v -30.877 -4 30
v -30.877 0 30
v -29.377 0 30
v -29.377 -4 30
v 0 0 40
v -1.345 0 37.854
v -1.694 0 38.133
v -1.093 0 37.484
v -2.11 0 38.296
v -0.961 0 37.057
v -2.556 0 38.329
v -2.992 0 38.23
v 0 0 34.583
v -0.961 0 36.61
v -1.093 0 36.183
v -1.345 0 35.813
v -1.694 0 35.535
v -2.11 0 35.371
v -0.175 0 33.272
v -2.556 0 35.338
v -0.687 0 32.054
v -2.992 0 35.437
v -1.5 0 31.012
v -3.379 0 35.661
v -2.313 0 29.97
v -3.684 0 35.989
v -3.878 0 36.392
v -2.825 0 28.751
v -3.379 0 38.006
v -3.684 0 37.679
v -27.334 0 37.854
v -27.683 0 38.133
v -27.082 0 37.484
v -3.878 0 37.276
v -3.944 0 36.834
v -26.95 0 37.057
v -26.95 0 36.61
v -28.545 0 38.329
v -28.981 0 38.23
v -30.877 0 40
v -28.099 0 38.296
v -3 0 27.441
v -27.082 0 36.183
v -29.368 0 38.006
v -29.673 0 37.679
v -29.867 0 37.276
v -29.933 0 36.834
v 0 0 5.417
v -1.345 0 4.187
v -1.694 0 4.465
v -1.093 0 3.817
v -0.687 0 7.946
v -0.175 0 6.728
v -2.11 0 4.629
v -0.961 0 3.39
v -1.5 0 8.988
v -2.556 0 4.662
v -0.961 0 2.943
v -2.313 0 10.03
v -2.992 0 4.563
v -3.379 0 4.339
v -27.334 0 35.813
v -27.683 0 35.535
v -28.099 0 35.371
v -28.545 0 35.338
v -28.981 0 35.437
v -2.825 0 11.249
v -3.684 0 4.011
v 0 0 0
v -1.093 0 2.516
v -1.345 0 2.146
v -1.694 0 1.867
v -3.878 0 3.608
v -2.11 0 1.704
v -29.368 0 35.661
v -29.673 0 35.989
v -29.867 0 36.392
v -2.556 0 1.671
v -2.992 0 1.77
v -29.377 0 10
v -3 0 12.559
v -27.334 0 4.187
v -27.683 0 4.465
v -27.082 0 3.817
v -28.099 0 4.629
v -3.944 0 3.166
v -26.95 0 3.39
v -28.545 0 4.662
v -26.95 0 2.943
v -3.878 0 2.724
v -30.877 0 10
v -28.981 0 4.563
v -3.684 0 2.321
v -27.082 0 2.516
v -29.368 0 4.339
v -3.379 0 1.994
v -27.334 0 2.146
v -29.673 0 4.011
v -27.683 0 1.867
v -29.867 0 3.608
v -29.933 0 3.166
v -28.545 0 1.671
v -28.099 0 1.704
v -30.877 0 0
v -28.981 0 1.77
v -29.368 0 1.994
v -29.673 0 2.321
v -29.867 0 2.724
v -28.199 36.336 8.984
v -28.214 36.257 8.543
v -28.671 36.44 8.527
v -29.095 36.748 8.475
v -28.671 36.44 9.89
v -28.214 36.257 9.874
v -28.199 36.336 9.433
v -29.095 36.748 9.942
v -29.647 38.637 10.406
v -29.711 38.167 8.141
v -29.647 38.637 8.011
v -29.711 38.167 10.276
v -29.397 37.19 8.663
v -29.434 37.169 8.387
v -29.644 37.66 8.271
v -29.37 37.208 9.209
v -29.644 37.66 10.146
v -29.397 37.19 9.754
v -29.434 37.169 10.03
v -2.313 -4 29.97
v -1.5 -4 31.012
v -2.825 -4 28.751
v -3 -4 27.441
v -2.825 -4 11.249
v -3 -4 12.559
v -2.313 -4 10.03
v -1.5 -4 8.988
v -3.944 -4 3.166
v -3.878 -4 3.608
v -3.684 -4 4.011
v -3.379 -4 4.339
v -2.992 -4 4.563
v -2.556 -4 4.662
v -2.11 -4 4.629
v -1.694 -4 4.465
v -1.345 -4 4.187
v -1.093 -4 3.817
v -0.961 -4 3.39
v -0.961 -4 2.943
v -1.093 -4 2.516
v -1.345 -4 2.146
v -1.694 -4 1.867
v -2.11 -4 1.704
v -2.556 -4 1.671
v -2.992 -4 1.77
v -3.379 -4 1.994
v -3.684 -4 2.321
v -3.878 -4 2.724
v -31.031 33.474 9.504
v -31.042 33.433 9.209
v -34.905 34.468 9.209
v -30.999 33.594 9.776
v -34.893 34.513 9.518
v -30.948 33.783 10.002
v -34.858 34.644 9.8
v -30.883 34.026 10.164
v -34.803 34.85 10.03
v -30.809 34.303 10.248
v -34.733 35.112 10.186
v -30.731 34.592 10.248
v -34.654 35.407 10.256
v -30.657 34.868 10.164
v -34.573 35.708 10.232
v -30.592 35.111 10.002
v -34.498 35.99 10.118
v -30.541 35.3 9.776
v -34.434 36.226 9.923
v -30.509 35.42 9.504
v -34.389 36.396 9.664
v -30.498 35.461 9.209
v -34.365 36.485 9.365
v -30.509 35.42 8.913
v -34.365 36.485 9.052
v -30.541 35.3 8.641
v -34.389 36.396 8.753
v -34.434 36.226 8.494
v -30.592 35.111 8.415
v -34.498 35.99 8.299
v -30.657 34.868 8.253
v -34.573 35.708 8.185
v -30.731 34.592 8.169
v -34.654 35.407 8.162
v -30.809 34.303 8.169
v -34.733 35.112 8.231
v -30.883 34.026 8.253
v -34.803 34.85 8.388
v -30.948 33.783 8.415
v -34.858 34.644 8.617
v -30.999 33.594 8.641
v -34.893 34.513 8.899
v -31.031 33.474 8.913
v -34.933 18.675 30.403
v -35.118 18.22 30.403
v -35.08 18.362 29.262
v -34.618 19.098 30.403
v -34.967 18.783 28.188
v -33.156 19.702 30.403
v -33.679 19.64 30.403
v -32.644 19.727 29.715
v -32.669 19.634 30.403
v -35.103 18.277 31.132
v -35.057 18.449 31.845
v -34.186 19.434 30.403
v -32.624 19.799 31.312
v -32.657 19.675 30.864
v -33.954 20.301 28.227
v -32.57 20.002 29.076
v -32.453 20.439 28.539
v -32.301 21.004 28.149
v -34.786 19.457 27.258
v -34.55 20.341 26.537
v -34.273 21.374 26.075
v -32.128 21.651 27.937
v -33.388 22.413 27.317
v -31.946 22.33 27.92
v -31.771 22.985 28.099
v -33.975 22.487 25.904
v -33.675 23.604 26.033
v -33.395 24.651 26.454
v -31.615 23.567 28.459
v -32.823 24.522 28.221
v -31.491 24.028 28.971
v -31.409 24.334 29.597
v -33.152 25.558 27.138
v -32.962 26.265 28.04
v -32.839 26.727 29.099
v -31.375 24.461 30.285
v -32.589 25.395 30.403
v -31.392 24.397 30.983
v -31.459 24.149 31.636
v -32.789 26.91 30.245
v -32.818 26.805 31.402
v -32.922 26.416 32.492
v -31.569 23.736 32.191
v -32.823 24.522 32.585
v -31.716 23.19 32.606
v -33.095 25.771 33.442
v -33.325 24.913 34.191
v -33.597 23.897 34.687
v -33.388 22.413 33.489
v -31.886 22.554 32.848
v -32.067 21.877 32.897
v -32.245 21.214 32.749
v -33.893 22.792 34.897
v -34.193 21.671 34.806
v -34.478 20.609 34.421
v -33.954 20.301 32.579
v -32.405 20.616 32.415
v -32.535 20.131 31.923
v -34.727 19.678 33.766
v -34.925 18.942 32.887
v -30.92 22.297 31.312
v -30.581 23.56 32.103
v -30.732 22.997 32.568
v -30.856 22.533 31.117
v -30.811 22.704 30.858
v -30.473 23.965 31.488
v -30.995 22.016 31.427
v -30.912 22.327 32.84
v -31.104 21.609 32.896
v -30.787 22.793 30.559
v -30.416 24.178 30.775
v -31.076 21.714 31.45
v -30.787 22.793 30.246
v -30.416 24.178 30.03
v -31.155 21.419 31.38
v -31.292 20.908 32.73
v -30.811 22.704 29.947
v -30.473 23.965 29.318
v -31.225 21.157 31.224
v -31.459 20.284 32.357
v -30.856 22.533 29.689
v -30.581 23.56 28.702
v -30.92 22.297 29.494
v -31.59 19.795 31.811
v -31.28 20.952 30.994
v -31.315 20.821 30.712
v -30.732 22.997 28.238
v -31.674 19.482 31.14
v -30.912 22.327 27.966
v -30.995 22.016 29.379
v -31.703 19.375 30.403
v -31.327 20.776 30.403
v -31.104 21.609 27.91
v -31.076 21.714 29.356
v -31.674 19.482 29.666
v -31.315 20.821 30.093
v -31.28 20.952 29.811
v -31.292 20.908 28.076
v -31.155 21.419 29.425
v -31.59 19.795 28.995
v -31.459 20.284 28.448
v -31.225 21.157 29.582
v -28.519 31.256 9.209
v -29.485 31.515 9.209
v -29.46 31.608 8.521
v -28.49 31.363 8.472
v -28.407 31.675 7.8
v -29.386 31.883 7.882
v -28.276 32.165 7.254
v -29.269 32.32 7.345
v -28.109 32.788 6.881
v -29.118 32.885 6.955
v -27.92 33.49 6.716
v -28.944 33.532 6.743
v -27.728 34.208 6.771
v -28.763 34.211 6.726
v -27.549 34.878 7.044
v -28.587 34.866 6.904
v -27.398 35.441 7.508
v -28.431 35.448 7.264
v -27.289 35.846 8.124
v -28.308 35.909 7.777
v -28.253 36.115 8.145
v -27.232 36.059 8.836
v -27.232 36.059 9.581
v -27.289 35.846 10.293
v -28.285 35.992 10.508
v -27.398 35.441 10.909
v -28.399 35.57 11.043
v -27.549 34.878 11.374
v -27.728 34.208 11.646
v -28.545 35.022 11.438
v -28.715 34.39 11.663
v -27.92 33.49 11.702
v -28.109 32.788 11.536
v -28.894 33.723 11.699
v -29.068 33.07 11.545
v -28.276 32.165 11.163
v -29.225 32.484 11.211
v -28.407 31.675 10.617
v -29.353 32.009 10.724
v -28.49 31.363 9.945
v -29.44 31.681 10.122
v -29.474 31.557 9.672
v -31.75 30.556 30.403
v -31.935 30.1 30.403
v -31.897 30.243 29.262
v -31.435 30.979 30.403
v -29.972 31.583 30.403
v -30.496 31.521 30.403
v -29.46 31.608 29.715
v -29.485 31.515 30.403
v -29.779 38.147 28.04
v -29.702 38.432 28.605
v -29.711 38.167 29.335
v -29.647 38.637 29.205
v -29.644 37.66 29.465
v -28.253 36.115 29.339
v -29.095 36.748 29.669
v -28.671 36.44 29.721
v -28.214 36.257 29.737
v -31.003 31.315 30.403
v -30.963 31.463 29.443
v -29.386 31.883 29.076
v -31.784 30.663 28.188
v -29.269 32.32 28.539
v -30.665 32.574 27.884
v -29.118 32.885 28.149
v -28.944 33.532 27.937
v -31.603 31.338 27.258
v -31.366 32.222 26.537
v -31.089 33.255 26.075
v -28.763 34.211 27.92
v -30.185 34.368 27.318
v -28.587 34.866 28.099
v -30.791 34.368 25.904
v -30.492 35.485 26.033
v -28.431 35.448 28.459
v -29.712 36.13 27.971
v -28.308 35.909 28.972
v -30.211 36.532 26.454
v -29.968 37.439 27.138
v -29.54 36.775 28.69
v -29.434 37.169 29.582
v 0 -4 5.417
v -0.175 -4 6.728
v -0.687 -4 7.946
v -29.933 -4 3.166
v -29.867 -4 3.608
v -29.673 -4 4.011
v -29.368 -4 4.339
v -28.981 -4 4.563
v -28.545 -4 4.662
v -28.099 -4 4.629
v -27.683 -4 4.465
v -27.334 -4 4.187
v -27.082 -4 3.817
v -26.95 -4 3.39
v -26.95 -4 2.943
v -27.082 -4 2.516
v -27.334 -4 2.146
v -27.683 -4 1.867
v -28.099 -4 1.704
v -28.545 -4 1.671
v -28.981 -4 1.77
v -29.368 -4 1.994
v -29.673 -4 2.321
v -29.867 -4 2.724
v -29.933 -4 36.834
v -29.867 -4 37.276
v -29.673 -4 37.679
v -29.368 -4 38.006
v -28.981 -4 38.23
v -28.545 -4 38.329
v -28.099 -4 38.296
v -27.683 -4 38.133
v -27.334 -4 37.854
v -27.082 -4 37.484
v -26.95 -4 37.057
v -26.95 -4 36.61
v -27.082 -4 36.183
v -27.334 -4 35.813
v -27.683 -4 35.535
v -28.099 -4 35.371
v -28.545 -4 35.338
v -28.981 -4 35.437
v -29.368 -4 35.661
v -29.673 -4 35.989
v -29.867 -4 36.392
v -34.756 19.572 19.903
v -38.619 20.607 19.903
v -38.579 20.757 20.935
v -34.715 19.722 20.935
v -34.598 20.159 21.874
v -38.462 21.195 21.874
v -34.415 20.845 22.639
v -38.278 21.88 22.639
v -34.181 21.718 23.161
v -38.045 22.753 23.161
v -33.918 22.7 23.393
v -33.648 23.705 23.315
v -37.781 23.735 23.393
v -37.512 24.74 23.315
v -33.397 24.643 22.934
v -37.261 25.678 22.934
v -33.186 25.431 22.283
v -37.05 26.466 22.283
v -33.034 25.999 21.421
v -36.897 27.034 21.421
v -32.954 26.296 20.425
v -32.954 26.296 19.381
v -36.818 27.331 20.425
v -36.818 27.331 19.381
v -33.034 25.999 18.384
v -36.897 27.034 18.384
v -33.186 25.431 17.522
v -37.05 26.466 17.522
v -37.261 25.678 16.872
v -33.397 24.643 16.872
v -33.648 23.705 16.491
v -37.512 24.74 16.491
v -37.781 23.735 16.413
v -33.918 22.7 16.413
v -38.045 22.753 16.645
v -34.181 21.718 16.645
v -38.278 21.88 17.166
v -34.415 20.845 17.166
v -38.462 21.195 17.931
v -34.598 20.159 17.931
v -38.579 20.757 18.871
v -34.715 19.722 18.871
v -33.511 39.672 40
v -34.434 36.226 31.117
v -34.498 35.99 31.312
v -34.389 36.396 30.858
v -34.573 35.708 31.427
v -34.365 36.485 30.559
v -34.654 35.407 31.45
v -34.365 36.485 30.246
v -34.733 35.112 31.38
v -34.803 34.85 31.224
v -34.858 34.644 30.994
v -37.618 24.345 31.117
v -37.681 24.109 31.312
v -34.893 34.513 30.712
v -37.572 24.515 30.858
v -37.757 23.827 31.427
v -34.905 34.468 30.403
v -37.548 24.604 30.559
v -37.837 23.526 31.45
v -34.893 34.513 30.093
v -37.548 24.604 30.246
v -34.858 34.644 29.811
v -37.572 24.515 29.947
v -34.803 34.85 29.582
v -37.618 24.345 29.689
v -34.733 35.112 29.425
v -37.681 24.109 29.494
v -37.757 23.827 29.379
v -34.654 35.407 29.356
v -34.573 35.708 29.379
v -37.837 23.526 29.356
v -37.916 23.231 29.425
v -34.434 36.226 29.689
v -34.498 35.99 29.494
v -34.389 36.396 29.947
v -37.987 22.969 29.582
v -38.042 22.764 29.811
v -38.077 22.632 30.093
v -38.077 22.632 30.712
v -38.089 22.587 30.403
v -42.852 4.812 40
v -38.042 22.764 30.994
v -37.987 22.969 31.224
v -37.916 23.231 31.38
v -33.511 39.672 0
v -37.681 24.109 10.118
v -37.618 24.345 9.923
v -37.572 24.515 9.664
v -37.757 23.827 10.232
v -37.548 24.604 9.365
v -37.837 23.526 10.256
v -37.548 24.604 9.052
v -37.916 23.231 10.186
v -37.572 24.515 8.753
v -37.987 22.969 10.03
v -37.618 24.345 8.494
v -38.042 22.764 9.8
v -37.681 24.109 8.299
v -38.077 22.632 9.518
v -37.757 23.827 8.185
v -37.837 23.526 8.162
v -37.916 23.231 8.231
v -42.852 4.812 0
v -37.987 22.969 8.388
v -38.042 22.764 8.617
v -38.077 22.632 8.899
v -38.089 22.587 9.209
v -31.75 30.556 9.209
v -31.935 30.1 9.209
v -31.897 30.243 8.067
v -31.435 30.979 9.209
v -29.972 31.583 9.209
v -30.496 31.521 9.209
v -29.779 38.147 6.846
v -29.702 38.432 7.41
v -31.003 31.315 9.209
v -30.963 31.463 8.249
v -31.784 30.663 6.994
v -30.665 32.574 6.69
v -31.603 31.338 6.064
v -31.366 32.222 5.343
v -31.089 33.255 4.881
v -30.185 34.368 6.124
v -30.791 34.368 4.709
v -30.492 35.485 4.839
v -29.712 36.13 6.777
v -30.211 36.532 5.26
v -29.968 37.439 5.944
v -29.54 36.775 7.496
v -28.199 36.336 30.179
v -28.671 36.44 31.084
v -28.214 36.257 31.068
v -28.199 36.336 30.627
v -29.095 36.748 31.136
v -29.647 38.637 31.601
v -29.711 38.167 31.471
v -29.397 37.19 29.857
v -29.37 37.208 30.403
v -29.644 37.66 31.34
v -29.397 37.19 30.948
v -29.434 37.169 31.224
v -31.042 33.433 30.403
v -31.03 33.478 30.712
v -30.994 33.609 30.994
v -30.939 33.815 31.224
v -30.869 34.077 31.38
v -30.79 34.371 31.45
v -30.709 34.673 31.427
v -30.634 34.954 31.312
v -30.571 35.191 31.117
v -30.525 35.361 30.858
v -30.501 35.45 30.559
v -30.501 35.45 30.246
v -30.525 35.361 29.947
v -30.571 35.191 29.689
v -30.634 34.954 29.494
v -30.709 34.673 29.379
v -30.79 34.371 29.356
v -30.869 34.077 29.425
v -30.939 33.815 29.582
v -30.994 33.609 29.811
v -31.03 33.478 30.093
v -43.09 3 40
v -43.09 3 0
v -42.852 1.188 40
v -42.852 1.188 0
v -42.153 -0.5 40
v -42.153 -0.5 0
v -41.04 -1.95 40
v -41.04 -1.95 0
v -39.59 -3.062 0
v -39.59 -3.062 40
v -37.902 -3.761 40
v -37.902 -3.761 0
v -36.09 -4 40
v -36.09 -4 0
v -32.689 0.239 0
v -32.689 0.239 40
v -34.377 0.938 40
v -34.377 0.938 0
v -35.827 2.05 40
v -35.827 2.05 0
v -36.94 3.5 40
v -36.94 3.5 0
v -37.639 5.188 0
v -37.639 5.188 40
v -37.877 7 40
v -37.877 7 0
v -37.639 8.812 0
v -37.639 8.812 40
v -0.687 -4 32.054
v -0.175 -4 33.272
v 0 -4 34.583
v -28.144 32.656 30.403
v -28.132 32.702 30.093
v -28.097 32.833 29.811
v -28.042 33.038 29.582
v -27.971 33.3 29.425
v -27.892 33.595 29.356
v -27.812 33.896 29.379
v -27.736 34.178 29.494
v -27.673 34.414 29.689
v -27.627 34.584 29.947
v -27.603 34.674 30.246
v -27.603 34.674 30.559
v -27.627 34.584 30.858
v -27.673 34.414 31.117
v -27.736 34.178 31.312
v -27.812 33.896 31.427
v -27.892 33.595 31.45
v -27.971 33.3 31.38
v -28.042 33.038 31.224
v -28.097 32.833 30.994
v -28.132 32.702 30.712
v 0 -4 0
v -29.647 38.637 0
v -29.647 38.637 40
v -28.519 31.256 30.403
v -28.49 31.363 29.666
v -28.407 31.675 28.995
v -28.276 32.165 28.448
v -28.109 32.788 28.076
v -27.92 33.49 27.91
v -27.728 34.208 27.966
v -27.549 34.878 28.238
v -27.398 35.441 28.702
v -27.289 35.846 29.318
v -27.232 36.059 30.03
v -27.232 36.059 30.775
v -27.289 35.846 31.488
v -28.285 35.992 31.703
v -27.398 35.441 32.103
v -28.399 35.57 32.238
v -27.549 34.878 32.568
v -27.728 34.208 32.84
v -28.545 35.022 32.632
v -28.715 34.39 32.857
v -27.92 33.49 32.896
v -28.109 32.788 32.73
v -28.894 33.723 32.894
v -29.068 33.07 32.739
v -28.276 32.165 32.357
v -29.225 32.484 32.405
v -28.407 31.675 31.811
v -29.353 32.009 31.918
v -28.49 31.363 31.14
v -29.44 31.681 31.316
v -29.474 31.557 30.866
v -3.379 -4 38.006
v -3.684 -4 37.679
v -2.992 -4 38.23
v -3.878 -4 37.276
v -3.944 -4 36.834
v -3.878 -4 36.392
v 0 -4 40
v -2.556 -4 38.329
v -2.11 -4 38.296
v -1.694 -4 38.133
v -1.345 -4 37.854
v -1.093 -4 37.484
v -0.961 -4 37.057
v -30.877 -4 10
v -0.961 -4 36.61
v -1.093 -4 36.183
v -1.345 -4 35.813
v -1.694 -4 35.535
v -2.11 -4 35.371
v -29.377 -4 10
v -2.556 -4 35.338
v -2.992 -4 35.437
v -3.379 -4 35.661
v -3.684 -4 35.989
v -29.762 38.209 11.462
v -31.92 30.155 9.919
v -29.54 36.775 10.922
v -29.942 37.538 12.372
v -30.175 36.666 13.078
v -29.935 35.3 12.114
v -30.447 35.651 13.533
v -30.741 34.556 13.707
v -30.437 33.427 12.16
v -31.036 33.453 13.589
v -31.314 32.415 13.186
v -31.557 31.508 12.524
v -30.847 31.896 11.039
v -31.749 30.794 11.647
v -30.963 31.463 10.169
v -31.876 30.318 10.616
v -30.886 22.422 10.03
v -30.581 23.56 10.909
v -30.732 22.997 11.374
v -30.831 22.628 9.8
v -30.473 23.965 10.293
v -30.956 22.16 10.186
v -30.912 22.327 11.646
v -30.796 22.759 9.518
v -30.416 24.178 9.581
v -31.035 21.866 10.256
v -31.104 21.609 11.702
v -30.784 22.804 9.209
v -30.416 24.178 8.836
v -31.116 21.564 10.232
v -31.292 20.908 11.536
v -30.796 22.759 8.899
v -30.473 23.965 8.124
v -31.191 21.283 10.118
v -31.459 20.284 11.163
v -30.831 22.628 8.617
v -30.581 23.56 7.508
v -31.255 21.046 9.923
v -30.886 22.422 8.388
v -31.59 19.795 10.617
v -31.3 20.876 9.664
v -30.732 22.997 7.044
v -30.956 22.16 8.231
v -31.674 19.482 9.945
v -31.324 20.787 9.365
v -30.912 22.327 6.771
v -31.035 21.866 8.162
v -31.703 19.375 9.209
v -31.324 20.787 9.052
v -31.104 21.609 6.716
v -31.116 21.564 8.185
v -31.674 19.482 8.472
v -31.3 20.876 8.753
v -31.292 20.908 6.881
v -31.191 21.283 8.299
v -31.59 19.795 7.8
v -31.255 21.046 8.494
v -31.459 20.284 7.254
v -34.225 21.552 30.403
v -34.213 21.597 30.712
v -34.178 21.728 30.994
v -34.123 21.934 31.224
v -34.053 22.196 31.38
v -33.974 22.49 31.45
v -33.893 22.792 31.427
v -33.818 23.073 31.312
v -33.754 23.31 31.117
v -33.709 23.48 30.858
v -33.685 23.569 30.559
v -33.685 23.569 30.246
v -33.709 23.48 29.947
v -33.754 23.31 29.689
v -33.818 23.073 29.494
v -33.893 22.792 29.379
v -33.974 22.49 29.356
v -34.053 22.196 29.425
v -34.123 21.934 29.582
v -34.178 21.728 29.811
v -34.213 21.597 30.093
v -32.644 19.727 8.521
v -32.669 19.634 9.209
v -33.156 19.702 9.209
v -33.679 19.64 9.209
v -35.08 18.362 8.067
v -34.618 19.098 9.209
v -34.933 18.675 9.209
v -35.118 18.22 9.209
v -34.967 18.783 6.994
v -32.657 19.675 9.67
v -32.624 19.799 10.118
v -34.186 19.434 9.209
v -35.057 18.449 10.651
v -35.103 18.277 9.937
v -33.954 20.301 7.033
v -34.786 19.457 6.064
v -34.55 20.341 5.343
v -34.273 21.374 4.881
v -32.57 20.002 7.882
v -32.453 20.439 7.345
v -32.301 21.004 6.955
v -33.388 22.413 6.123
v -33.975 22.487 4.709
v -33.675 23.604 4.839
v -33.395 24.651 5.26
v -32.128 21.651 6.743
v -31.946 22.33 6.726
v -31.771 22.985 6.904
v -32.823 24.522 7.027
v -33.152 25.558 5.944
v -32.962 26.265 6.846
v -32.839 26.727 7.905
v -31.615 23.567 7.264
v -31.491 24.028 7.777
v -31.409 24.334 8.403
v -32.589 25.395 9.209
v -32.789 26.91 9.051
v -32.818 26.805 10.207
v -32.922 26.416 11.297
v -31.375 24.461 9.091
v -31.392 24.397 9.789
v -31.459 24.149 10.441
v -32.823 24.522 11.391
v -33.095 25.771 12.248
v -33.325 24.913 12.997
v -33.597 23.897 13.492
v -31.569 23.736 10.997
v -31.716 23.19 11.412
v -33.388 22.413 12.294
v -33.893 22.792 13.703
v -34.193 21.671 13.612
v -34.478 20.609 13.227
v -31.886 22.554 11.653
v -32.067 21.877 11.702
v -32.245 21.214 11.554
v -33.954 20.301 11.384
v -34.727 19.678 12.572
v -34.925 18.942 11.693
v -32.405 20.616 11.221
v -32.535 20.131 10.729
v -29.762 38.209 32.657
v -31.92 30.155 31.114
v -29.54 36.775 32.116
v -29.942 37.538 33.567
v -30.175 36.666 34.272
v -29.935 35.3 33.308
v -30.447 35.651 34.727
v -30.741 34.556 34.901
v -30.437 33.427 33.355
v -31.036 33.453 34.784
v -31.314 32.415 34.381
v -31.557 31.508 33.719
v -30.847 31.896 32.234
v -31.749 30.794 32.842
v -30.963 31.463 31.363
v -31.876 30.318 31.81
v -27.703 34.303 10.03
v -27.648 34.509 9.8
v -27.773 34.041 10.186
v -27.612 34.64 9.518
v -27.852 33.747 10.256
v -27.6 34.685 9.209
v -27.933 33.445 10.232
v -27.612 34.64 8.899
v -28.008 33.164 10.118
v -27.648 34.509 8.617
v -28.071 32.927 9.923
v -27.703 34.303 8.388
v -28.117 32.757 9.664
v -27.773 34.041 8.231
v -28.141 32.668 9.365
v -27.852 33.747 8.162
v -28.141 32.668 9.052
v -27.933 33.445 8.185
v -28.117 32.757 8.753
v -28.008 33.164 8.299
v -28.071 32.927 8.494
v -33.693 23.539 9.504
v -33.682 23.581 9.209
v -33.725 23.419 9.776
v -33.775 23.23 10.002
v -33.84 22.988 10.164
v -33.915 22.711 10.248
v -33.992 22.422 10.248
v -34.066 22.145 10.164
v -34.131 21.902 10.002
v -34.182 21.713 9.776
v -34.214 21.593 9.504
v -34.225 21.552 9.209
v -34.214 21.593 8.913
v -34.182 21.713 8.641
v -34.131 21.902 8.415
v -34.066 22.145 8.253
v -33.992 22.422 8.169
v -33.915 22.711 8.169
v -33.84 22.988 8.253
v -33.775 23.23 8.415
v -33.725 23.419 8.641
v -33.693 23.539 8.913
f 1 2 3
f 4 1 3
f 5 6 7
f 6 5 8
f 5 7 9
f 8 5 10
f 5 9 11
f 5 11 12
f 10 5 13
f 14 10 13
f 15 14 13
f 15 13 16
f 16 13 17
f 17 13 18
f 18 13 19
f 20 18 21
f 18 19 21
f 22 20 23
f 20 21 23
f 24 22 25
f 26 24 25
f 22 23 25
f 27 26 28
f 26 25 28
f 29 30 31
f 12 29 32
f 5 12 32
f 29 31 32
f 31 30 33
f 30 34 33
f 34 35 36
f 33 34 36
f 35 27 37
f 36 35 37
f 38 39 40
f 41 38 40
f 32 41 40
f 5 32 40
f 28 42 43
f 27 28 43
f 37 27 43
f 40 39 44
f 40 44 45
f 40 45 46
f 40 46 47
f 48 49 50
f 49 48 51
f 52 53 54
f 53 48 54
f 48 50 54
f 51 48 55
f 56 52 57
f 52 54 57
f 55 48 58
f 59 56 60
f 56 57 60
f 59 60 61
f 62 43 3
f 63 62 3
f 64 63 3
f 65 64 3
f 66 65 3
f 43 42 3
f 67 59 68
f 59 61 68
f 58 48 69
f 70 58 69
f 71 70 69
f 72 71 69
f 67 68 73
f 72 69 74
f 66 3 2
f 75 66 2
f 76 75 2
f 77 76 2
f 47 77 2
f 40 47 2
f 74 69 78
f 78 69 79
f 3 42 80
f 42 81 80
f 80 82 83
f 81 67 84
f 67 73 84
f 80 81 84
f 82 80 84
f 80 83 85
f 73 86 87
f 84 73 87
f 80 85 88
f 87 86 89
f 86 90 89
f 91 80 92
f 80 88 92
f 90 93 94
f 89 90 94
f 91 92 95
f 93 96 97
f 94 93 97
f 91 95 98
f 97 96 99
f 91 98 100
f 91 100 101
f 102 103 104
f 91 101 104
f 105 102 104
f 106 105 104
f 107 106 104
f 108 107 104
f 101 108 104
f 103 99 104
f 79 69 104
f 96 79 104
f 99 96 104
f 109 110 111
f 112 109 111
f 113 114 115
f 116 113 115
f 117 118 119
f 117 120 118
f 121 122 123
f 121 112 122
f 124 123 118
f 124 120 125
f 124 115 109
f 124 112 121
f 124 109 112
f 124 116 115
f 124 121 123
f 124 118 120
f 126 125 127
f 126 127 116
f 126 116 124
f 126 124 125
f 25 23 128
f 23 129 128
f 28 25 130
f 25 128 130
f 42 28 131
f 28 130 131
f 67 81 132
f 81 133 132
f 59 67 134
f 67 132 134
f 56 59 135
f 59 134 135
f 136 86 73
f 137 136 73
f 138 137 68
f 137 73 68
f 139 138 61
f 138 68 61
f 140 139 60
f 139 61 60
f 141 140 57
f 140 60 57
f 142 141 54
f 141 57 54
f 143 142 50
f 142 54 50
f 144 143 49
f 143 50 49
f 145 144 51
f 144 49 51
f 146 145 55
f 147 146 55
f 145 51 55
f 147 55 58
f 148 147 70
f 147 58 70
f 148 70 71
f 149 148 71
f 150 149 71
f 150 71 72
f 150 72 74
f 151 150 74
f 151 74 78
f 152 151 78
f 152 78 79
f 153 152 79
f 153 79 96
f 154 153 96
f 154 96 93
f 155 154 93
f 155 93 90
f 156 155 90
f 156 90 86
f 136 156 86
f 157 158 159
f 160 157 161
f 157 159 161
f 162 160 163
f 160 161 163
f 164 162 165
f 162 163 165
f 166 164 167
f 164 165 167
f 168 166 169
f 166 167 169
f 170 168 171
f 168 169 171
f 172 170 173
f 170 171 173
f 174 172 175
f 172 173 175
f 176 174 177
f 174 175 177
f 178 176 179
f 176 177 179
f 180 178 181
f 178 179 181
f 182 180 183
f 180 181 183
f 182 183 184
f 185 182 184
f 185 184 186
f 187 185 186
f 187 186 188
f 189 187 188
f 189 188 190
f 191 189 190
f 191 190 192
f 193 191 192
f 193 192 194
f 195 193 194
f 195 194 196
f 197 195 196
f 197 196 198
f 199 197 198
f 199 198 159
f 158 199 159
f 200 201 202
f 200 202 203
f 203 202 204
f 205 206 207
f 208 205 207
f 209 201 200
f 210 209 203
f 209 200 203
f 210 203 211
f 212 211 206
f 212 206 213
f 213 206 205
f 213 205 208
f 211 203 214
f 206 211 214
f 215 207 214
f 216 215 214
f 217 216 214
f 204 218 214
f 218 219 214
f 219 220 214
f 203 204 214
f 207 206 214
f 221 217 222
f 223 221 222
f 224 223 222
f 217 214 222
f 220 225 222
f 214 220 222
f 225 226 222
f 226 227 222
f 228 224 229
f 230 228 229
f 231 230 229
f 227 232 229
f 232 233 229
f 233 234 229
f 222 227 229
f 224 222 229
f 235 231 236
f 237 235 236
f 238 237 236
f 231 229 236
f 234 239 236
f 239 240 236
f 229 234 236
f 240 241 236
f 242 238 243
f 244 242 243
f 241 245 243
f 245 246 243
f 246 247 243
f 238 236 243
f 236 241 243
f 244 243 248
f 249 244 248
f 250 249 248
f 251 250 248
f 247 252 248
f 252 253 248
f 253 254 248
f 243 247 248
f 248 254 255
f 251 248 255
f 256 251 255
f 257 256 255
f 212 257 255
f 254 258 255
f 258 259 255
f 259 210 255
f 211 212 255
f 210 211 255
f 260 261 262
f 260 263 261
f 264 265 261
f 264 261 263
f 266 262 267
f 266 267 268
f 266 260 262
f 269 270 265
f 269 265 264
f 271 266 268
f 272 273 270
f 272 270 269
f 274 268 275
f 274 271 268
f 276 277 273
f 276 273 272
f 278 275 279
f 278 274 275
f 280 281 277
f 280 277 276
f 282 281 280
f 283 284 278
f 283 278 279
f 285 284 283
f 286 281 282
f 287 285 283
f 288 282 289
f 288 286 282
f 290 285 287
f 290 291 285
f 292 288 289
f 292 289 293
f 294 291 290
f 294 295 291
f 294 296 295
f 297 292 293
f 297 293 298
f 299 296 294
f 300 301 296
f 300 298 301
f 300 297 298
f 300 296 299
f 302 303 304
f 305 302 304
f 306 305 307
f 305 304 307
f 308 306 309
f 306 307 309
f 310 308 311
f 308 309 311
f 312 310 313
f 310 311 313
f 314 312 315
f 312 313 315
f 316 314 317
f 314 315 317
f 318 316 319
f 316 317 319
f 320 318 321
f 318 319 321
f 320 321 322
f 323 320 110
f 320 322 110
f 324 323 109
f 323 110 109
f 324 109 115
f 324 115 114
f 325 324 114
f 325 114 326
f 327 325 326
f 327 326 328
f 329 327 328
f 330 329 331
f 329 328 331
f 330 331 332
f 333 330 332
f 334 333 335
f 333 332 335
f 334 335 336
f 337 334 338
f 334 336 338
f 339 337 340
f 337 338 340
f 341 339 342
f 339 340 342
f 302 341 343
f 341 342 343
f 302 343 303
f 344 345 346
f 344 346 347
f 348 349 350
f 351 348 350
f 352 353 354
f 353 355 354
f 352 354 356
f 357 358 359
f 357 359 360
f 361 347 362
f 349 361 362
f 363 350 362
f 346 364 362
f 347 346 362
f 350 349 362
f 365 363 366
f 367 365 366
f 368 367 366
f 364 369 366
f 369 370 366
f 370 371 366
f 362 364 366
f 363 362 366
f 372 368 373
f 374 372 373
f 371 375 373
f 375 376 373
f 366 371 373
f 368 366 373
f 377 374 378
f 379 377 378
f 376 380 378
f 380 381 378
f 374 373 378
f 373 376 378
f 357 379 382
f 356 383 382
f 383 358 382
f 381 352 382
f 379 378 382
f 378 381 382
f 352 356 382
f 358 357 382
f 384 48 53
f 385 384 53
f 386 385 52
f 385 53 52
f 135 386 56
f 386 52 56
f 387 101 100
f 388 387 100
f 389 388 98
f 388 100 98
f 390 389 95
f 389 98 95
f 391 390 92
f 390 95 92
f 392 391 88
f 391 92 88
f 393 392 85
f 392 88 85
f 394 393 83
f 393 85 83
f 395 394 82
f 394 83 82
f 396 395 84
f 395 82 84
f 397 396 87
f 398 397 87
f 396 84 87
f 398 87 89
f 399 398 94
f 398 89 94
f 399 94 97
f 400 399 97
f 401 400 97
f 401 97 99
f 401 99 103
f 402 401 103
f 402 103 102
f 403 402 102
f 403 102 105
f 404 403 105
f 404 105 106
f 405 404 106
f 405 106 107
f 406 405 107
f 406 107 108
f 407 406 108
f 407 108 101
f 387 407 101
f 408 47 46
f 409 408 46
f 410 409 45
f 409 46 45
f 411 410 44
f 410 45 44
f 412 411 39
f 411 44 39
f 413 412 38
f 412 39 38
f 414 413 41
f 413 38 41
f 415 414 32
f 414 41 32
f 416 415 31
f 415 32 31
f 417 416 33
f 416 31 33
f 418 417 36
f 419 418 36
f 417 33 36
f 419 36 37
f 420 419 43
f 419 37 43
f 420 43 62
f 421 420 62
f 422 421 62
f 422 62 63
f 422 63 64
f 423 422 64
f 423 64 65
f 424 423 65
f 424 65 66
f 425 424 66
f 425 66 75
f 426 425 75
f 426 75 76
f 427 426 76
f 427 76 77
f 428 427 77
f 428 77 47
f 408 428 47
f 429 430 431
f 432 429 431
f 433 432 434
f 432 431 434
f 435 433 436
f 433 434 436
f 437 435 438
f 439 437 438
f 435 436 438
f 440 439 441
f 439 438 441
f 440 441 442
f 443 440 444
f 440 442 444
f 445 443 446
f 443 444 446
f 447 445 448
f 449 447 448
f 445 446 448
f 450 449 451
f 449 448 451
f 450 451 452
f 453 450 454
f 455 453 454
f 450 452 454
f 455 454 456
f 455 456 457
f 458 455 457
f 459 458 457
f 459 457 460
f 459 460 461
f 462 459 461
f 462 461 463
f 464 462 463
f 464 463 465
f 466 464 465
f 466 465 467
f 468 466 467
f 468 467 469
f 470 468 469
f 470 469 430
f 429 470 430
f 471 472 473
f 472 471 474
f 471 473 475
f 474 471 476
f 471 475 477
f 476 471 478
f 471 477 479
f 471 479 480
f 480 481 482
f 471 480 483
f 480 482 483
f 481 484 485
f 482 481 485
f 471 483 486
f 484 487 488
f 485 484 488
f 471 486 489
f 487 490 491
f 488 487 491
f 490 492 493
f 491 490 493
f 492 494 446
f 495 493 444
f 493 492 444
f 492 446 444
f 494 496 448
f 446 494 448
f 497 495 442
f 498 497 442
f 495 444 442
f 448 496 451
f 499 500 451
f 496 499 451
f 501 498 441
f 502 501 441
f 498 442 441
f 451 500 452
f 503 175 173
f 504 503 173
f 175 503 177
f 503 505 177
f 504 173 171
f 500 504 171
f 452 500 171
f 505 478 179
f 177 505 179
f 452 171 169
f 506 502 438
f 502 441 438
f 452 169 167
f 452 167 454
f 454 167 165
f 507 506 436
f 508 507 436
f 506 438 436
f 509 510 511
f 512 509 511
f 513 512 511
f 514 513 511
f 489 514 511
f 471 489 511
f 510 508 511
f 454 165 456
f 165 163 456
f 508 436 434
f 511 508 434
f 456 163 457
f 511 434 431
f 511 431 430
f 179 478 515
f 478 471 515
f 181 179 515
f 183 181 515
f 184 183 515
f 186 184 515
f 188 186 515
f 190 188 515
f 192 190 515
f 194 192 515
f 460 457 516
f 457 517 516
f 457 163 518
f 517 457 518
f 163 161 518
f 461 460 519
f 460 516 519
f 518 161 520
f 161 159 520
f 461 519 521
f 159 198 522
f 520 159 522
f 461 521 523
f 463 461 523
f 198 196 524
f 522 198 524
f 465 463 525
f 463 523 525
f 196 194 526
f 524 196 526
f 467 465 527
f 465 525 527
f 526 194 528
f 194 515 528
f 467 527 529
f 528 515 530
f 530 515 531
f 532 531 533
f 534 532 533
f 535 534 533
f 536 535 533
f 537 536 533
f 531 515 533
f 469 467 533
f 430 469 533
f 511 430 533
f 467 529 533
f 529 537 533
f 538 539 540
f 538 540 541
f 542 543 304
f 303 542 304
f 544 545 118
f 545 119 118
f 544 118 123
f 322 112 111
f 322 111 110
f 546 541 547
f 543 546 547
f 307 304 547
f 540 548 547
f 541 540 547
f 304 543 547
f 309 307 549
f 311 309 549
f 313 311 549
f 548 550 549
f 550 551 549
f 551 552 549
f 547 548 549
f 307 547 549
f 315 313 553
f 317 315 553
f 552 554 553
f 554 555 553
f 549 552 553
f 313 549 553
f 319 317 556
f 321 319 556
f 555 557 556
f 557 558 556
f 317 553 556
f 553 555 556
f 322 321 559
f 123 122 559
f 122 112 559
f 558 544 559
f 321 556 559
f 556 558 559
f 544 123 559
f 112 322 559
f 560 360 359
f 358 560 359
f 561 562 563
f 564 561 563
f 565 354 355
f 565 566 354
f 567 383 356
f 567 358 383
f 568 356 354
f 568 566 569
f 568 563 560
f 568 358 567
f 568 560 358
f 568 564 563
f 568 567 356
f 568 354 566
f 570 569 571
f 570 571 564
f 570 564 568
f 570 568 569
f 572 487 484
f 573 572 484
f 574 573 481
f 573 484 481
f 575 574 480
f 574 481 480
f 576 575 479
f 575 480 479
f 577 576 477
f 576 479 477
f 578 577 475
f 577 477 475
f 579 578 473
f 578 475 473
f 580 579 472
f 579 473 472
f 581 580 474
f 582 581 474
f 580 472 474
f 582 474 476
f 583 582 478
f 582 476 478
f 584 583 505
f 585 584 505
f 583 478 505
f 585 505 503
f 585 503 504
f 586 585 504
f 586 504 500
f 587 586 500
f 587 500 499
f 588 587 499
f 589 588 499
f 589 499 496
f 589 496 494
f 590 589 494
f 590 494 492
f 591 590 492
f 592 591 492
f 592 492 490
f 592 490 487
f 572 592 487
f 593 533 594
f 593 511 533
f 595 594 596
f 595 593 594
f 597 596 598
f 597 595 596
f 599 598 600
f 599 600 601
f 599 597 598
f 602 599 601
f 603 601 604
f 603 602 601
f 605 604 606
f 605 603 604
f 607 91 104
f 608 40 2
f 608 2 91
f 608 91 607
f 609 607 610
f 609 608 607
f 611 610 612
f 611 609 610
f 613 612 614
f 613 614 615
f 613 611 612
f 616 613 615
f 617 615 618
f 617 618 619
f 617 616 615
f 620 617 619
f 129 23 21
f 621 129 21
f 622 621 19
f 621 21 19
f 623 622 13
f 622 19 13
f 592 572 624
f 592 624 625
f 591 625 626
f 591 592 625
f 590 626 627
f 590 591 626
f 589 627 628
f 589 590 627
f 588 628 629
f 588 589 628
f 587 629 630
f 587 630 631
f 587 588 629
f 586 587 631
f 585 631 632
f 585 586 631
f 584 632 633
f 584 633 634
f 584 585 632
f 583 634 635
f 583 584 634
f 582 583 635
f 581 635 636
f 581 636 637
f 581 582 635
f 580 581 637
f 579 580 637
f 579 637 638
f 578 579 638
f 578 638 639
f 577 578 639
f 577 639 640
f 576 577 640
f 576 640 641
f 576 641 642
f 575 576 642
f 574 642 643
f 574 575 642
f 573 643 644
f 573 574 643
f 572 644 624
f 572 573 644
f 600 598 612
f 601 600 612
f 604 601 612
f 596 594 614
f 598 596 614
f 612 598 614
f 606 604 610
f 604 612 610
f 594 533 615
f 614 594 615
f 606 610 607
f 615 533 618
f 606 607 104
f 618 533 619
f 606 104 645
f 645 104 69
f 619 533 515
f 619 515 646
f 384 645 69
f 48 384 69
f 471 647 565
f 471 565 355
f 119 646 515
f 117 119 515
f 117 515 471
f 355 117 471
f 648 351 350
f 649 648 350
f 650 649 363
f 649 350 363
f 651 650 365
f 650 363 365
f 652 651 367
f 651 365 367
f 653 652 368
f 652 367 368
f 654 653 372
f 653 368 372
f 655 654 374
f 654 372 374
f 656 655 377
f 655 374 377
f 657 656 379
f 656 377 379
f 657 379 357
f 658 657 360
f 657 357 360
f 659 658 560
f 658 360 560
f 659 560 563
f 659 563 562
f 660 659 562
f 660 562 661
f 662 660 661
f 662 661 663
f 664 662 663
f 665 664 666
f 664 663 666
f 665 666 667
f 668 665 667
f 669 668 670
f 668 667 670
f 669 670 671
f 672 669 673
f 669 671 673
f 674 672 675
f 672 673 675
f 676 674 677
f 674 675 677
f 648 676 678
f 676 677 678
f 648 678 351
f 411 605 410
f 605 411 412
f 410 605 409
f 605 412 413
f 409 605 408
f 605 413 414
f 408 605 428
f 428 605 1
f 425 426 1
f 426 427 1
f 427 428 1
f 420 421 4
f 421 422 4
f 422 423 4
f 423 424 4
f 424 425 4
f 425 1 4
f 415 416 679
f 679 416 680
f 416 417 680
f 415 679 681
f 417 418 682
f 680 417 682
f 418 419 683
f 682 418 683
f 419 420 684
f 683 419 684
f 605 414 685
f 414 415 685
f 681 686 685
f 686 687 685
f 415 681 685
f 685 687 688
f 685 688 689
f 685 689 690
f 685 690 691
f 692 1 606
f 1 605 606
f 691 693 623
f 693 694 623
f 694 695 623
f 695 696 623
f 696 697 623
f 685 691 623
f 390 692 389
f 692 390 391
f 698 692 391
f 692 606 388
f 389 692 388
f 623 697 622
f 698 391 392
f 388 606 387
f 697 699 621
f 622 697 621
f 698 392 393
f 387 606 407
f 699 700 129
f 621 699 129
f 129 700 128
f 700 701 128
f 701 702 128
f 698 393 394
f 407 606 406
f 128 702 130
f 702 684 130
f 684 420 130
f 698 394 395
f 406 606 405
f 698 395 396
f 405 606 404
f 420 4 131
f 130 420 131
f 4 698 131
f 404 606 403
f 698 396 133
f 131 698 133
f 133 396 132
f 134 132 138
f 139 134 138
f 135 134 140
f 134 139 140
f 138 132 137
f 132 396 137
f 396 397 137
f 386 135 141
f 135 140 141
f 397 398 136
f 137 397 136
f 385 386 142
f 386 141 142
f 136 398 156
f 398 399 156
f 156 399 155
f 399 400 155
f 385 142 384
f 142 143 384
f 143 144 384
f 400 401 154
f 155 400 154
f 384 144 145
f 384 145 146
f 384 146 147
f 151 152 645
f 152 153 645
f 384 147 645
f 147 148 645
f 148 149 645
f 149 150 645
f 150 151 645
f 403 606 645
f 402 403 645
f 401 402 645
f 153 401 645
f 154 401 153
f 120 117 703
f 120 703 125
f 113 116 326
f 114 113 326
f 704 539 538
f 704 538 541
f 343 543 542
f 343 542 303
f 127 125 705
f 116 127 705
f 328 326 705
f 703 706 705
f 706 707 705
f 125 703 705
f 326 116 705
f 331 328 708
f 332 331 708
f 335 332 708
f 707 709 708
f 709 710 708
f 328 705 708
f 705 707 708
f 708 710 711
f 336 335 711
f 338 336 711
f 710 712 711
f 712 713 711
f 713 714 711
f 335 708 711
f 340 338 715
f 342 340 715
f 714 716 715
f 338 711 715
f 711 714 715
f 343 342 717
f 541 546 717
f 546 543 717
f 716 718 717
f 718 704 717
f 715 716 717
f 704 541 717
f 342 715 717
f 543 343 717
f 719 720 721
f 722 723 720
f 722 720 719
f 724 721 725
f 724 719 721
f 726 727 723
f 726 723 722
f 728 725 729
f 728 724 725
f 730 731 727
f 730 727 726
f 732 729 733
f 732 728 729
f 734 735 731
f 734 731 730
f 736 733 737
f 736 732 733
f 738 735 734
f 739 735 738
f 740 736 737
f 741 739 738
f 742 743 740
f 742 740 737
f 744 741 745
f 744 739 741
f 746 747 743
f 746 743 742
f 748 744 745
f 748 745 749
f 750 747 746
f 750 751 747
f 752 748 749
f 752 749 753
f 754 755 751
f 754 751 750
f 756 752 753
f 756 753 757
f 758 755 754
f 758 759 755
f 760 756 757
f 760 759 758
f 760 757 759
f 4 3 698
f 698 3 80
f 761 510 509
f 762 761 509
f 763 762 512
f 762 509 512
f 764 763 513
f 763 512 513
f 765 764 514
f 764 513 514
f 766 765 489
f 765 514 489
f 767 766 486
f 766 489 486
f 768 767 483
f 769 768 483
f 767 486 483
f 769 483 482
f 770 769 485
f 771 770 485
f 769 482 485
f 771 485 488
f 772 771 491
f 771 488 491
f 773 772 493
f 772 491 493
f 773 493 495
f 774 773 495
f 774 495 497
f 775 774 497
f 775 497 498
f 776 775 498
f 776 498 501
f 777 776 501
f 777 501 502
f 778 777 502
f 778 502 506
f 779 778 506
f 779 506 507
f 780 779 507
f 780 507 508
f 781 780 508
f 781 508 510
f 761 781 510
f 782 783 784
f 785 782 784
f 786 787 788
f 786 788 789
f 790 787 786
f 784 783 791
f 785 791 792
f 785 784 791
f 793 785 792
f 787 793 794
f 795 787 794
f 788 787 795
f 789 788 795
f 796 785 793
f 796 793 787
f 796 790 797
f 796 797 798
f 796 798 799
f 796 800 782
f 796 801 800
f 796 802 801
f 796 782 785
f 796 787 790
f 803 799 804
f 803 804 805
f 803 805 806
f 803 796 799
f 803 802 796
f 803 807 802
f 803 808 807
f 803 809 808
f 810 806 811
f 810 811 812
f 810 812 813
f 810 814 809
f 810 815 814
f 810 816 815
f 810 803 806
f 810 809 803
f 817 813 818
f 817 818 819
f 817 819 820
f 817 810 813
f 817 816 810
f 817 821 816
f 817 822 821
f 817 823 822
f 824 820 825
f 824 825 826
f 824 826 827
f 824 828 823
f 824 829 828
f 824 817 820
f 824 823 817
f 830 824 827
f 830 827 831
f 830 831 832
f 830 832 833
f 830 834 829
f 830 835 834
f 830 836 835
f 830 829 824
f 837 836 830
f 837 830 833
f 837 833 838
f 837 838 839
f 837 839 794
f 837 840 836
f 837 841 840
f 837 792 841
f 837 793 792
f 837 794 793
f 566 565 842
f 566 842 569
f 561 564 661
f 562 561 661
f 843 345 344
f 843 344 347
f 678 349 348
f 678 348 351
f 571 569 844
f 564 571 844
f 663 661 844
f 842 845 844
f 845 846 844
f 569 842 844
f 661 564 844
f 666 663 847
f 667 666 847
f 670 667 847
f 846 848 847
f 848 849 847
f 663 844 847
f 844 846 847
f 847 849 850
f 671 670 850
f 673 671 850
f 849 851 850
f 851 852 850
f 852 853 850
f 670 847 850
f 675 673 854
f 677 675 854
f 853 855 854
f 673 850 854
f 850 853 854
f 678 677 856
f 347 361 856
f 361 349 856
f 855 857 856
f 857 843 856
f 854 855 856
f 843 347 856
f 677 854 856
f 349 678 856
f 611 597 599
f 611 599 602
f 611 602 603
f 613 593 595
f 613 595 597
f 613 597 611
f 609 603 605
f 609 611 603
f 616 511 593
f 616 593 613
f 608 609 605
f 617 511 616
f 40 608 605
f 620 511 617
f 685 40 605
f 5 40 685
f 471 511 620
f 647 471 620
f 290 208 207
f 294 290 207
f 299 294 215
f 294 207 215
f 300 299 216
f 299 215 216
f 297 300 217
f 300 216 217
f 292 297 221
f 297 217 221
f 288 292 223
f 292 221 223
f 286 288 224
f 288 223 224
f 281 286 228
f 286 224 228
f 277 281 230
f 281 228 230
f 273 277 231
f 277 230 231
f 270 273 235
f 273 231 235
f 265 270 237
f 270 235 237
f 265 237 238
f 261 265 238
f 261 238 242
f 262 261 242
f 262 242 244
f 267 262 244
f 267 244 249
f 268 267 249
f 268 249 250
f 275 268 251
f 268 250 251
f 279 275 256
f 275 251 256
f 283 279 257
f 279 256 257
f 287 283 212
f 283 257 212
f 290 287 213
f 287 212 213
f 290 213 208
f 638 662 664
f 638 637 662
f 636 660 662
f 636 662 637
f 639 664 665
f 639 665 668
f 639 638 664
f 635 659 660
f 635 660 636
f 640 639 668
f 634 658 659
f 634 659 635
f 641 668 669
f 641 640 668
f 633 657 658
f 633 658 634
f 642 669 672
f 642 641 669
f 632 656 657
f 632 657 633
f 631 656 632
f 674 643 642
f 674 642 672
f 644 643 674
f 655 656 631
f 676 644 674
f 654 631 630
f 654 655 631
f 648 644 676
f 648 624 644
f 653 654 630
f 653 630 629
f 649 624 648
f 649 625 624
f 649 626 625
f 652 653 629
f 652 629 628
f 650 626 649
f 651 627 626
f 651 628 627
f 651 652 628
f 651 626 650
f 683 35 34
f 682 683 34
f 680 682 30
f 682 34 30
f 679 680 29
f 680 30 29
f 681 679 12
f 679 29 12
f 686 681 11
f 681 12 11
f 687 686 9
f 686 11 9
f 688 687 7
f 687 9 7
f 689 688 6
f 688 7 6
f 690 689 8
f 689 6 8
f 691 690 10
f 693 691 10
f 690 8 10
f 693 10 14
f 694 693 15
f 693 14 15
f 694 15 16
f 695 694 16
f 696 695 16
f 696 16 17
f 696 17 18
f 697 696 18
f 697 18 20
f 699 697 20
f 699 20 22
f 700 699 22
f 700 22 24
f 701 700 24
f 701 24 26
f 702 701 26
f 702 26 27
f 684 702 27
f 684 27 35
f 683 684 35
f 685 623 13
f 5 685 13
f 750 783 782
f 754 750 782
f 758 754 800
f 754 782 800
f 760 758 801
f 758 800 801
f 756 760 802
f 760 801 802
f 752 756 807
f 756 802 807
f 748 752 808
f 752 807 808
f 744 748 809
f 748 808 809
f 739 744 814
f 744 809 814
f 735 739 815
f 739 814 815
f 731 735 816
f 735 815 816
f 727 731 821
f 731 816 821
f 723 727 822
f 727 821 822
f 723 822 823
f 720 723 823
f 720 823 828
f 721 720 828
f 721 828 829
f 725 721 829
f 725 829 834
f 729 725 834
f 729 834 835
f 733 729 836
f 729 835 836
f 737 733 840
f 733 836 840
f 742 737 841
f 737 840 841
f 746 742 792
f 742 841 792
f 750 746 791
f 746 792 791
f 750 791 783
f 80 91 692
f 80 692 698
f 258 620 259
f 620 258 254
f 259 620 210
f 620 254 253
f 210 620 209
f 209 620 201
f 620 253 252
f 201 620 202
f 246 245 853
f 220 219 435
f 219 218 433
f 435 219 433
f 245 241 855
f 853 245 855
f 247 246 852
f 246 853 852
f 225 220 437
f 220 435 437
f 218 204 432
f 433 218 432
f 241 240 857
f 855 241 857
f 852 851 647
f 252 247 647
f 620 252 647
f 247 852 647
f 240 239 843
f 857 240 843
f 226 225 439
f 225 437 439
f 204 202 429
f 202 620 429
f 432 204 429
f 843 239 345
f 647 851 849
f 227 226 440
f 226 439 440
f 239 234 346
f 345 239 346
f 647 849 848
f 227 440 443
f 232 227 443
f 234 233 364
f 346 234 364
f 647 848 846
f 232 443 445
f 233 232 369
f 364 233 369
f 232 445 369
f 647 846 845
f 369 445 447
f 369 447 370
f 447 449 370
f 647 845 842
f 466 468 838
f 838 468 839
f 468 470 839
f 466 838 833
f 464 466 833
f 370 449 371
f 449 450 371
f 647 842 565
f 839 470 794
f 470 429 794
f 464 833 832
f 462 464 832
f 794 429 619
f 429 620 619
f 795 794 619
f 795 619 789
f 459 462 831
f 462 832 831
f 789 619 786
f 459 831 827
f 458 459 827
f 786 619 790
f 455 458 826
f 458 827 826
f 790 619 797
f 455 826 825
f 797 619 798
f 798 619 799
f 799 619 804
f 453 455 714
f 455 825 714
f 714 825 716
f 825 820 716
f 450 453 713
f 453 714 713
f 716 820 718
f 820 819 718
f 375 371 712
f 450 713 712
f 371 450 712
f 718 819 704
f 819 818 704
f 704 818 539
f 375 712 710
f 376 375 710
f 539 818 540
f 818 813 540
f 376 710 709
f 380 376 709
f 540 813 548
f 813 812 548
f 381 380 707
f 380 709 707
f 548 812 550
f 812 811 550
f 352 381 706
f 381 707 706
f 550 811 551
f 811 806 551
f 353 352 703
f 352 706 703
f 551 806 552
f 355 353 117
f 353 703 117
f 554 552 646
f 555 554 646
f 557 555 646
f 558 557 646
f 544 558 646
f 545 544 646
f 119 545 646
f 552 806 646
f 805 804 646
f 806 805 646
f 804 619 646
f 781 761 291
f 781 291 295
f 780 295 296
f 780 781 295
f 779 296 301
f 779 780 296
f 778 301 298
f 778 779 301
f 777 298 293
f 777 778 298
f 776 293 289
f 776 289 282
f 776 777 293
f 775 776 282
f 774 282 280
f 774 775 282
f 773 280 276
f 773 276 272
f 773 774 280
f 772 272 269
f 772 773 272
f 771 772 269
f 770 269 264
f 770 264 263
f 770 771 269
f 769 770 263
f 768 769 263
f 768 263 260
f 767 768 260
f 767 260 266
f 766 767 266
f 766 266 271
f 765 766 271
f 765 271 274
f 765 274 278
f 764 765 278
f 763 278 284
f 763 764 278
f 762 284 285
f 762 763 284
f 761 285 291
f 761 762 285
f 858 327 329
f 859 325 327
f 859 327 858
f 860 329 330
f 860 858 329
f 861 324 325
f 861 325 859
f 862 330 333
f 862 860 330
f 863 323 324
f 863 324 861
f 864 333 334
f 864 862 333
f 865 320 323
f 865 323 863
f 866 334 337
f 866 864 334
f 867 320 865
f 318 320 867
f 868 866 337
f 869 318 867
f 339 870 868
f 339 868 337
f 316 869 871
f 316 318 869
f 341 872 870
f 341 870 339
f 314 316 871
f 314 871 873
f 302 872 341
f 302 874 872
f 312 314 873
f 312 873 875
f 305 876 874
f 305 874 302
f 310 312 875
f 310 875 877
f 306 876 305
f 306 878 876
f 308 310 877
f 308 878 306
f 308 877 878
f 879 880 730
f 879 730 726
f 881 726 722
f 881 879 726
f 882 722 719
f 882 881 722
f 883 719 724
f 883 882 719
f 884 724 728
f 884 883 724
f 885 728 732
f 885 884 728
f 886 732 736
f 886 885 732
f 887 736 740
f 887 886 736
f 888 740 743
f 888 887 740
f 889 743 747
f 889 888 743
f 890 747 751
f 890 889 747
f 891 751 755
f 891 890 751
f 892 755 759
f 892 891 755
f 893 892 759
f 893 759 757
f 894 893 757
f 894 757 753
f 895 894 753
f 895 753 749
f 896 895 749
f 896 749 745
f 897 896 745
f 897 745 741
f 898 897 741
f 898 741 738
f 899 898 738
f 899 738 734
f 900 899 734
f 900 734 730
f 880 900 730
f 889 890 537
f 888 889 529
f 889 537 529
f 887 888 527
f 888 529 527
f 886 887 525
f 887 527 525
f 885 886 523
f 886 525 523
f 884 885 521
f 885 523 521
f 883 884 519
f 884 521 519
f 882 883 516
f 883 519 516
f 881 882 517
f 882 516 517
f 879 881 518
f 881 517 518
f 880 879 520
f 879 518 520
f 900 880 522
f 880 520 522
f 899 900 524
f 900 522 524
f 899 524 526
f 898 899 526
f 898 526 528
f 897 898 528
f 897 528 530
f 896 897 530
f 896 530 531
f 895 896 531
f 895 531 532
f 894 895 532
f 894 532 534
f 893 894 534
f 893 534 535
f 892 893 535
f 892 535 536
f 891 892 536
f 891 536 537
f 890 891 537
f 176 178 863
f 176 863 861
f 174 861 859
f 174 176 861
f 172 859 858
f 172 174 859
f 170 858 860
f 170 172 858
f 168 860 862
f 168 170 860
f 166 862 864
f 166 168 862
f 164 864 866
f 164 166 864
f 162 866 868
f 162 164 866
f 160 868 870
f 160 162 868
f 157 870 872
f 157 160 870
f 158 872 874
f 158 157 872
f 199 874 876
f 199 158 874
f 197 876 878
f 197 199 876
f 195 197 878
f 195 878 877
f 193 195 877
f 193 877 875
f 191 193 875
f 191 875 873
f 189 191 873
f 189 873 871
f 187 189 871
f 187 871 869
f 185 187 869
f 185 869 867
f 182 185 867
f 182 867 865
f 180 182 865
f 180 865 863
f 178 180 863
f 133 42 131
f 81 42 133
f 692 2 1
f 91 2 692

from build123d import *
from build123d.topology import SkipClean

# Parameters (mm, degrees)
ESTRUSIONE_ESTRUSIONE1_DEPTH = 40
RACCORDO1_R                  = 7
SCHIZZO2_W                   = 1.5
SCHIZZO2_H                   = 20
TAGLIO_ESTRUSIONE1_DEPTH     = 40
SCHIZZO3_R                   = 1.05
SCHIZZO3_R_2                 = 3.5
TAGLIO_ESTRUSIONE2_DEPTH     = 40
SCHIZZO4_R                   = 2.5
SCHIZZO4_R_2                 = 1.05
ESTRUSIONE_ESTRUSIONE2_DEPTH = 3
RACCORDO2_R                  = 2
SCHIZZO5_R                   = 1.5
TAGLIO_ESTRUSIONE3_DEPTH     = 17
TAGLIO_ESTRUSIONE4_DEPTH     = 10
RACCORDO3_R                  = 5
RACCORDO4_R                  = 5


with BuildPart() as part:
    # Schizzo1 → Estrusione-Estrusione1 (new body)
    with BuildSketch(Plane.XY):
        Polygon((0, 0), (-40, 0), (-29.647238196, 38.637033052), (-33.510941501, 39.672309232), (-45.212901491, -4), (0, -4), align=None)
    extrude(amount=ESTRUSIONE_ESTRUSIONE1_DEPTH)

    # Raccordo1
    raccordo1_edges = [part.edges().sort_by_distance(p)[0] for p in [
        (-45.212901491, -4, 20),
        (-40, 0, 20),
    ]]
    fillet(raccordo1_edges, radius=RACCORDO1_R)

    # Schizzo2 → Taglio-Estrusione1 (cut)
    with BuildSketch(Plane(origin=(0, 0, 0), x_dir=(1, 0, 0), z_dir=(0, 1, 0))):
        with Locations((-30.12742239, -20)):
            Rectangle(SCHIZZO2_W, SCHIZZO2_H)
    extrude(amount=-TAGLIO_ESTRUSIONE1_DEPTH, mode=Mode.SUBTRACT)

    # Schizzo3 → Taglio-Estrusione2 (cut)
    with BuildSketch(Plane(origin=(-41.184211381, 11.03527618, 0), x_dir=(0, 0, 1), z_dir=(-0.9659258262890673, 0.2588190451025247, 0))):
        with Locations(Location((30.402866557, 25.309568218, 0), (0, 0, 270))):
            Circle(SCHIZZO3_R)
        with Locations(Location((9.20859967, 25.309568218, 0), (0, 0, 270))):
            Circle(SCHIZZO3_R)
        with Locations(Location((30.402866557, 13.009568218, 0), (0, 0, 270))):
            Circle(SCHIZZO3_R)
        with Locations(Location((9.20859967, 13.009568218, 0), (0, 0, 270))):
            Circle(SCHIZZO3_R)
        with Locations(Location((19.902866557, 13.409568216, 0), (0, 0, 270))):
            Circle(SCHIZZO3_R_2)
    extrude(amount=-TAGLIO_ESTRUSIONE2_DEPTH, mode=Mode.SUBTRACT)

    # Schizzo4 → Estrusione-Estrusione2 (add)
    # profile 1 of 4: a face of its own
    with SkipClean():  # the faces are left unmerged after this step: merging them gives an invalid solid
        with BuildSketch(Plane(origin=(-37.320508076, 10, 0), x_dir=(0, 0, -1), z_dir=(0.9659258262890674, -0.2588190451025245, 0))):
            with Locations(Location((-9.20859967, 13.009568218, 0), (0, 0, 270))):
                Circle(SCHIZZO4_R)
            with Locations(Location((-9.20859967, 13.009568218, 0), (0, 0, 90))):
                Circle(SCHIZZO4_R_2, mode=Mode.SUBTRACT)
        # profile 2 of 4: a face of its own
        with BuildSketch(Plane(origin=(-37.320508076, 10, 0), x_dir=(0, 0, -1), z_dir=(0.9659258262890674, -0.2588190451025245, 0))):
            with Locations(Location((-30.402866557, 13.009568218, 0), (0, 0, 270))):
                Circle(SCHIZZO4_R)
            with Locations(Location((-30.402866557, 13.009568218, 0), (0, 0, 270))):
                Circle(SCHIZZO4_R_2, mode=Mode.SUBTRACT)
        # profile 3 of 4: a face of its own
        with BuildSketch(Plane(origin=(-37.320508076, 10, 0), x_dir=(0, 0, -1), z_dir=(0.9659258262890674, -0.2588190451025245, 0))):
            with Locations(Location((-30.402866557, 25.309568218, 0), (0, 0, 270))):
                Circle(SCHIZZO4_R)
            with Locations(Location((-30.402866557, 25.309568218, 0), (0, 0, 270))):
                Circle(SCHIZZO4_R_2, mode=Mode.SUBTRACT)
        # profile 4 of 4: a face of its own
        with BuildSketch(Plane(origin=(-37.320508076, 10, 0), x_dir=(0, 0, -1), z_dir=(0.9659258262890674, -0.2588190451025245, 0))):
            with Locations(Location((-9.20859967, 25.309568218, 0), (0, 0, 270))):
                Circle(SCHIZZO4_R)
            with Locations(Location((-9.20859967, 25.309568218, 0), (0, 0, 90))):
                Circle(SCHIZZO4_R_2, mode=Mode.SUBTRACT)
        extrude(amount=ESTRUSIONE_ESTRUSIONE2_DEPTH)
    add(part.part.scale(1), mode=Mode.REPLACE)  # the faces are merged on a copy

    # Raccordo2
    raccordo2_edges = [part.edges().sort_by_distance(p)[0] for p in [
        (-30.122862185, 36.86198016, 9.20859967),
        (-33.306336439, 24.981092497, 9.20859967),
        (-33.306336439, 24.981092497, 30.402866557),
        (-30.122862185, 36.86198016, 30.402866557),
    ]]
    fillet(raccordo2_edges, radius=RACCORDO2_R)

    # Schizzo5 → Taglio-Estrusione3 (cut)
    with BuildSketch(Plane(origin=(0, 0, 0), x_dir=(1, 0, 0), z_dir=(0, 1, 0))):
        with Locations(Location((-2.444220089, -36.8336475, 0), (0, 0, 180))):
            Circle(SCHIZZO5_R)
        with Locations(Location((-2.444220089, -3.1663525, 0), (0, 0, 180))):
            Circle(SCHIZZO5_R)
        with Locations(Location((-28.433202301, -3.1663525, 0), (0, 0, 180))):
            Circle(SCHIZZO5_R)
        with Locations(Location((-28.433202301, -36.8336475, 0), (0, 0, 180))):
            Circle(SCHIZZO5_R)
    extrude(amount=-TAGLIO_ESTRUSIONE3_DEPTH, mode=Mode.SUBTRACT)

    # Schizzo6 → Taglio-Estrusione4 (cut)
    with BuildSketch(Plane(origin=(0, 0, 0), x_dir=(1, 0, 0), z_dir=(0, 1, 0))):
        Polygon((0, -20), (0, -30), (-3, -30), (-3, -10), (0, -10), align=None)
    extrude(amount=-TAGLIO_ESTRUSIONE4_DEPTH, mode=Mode.SUBTRACT)

    # Raccordo3
    # the kernel refuses this fillet: 5 mm, written as the material it takes off along each edge
    with BuildSketch(Plane(origin=(0, 11.456439237, 10), x_dir=(0, 0, -1), z_dir=(0, -1, 0))) as raccordo3_piece_1:
        with BuildLine():
            CenterArc((4.582575695, -5), RACCORDO3_R, 90, 66.421821522)
            Line((0, -3), (-0.091651514, -2.96))
            ThreePointArc((-0.091651514, -2.96), (-0.1, -1.5), (-0.1, 0))
            Line((-0.1, 0), (0, 0.1))
            Line((0, 0.1), (4.582575695, 0.1))
            Line((4.582575695, 0.1), (4.582575695, 0))
        make_face()
    extrude(amount=26.912878475, mode=Mode.SUBTRACT)
    with BuildSketch(Plane(origin=(0, 11.456439237, 30), x_dir=(0, 0, 1), z_dir=(0, -1, 0))) as raccordo3_piece_2:
        with BuildLine():
            CenterArc((4.582575695, 5), RACCORDO3_R, 203.578178478, 66.421821522)
            Line((0, 3), (-0.091651514, 2.96))
            ThreePointArc((-0.091651514, 2.96), (-0.1, 1.5), (-0.1, 0))
            Line((-0.1, 0), (0, -0.1))
            Line((0, -0.1), (4.582575695, -0.1))
            Line((4.582575695, -0.1), (4.582575695, 0))
        make_face()
    extrude(amount=26.912878475, mode=Mode.SUBTRACT)

    # Raccordo4
    raccordo4_edges = [part.edges().sort_by_distance(p)[0] for p in [
        (-3, -2, 30),
        (-3, -2, 10),
    ]]
    fillet(raccordo4_edges, radius=RACCORDO4_R)


solid = part.part
